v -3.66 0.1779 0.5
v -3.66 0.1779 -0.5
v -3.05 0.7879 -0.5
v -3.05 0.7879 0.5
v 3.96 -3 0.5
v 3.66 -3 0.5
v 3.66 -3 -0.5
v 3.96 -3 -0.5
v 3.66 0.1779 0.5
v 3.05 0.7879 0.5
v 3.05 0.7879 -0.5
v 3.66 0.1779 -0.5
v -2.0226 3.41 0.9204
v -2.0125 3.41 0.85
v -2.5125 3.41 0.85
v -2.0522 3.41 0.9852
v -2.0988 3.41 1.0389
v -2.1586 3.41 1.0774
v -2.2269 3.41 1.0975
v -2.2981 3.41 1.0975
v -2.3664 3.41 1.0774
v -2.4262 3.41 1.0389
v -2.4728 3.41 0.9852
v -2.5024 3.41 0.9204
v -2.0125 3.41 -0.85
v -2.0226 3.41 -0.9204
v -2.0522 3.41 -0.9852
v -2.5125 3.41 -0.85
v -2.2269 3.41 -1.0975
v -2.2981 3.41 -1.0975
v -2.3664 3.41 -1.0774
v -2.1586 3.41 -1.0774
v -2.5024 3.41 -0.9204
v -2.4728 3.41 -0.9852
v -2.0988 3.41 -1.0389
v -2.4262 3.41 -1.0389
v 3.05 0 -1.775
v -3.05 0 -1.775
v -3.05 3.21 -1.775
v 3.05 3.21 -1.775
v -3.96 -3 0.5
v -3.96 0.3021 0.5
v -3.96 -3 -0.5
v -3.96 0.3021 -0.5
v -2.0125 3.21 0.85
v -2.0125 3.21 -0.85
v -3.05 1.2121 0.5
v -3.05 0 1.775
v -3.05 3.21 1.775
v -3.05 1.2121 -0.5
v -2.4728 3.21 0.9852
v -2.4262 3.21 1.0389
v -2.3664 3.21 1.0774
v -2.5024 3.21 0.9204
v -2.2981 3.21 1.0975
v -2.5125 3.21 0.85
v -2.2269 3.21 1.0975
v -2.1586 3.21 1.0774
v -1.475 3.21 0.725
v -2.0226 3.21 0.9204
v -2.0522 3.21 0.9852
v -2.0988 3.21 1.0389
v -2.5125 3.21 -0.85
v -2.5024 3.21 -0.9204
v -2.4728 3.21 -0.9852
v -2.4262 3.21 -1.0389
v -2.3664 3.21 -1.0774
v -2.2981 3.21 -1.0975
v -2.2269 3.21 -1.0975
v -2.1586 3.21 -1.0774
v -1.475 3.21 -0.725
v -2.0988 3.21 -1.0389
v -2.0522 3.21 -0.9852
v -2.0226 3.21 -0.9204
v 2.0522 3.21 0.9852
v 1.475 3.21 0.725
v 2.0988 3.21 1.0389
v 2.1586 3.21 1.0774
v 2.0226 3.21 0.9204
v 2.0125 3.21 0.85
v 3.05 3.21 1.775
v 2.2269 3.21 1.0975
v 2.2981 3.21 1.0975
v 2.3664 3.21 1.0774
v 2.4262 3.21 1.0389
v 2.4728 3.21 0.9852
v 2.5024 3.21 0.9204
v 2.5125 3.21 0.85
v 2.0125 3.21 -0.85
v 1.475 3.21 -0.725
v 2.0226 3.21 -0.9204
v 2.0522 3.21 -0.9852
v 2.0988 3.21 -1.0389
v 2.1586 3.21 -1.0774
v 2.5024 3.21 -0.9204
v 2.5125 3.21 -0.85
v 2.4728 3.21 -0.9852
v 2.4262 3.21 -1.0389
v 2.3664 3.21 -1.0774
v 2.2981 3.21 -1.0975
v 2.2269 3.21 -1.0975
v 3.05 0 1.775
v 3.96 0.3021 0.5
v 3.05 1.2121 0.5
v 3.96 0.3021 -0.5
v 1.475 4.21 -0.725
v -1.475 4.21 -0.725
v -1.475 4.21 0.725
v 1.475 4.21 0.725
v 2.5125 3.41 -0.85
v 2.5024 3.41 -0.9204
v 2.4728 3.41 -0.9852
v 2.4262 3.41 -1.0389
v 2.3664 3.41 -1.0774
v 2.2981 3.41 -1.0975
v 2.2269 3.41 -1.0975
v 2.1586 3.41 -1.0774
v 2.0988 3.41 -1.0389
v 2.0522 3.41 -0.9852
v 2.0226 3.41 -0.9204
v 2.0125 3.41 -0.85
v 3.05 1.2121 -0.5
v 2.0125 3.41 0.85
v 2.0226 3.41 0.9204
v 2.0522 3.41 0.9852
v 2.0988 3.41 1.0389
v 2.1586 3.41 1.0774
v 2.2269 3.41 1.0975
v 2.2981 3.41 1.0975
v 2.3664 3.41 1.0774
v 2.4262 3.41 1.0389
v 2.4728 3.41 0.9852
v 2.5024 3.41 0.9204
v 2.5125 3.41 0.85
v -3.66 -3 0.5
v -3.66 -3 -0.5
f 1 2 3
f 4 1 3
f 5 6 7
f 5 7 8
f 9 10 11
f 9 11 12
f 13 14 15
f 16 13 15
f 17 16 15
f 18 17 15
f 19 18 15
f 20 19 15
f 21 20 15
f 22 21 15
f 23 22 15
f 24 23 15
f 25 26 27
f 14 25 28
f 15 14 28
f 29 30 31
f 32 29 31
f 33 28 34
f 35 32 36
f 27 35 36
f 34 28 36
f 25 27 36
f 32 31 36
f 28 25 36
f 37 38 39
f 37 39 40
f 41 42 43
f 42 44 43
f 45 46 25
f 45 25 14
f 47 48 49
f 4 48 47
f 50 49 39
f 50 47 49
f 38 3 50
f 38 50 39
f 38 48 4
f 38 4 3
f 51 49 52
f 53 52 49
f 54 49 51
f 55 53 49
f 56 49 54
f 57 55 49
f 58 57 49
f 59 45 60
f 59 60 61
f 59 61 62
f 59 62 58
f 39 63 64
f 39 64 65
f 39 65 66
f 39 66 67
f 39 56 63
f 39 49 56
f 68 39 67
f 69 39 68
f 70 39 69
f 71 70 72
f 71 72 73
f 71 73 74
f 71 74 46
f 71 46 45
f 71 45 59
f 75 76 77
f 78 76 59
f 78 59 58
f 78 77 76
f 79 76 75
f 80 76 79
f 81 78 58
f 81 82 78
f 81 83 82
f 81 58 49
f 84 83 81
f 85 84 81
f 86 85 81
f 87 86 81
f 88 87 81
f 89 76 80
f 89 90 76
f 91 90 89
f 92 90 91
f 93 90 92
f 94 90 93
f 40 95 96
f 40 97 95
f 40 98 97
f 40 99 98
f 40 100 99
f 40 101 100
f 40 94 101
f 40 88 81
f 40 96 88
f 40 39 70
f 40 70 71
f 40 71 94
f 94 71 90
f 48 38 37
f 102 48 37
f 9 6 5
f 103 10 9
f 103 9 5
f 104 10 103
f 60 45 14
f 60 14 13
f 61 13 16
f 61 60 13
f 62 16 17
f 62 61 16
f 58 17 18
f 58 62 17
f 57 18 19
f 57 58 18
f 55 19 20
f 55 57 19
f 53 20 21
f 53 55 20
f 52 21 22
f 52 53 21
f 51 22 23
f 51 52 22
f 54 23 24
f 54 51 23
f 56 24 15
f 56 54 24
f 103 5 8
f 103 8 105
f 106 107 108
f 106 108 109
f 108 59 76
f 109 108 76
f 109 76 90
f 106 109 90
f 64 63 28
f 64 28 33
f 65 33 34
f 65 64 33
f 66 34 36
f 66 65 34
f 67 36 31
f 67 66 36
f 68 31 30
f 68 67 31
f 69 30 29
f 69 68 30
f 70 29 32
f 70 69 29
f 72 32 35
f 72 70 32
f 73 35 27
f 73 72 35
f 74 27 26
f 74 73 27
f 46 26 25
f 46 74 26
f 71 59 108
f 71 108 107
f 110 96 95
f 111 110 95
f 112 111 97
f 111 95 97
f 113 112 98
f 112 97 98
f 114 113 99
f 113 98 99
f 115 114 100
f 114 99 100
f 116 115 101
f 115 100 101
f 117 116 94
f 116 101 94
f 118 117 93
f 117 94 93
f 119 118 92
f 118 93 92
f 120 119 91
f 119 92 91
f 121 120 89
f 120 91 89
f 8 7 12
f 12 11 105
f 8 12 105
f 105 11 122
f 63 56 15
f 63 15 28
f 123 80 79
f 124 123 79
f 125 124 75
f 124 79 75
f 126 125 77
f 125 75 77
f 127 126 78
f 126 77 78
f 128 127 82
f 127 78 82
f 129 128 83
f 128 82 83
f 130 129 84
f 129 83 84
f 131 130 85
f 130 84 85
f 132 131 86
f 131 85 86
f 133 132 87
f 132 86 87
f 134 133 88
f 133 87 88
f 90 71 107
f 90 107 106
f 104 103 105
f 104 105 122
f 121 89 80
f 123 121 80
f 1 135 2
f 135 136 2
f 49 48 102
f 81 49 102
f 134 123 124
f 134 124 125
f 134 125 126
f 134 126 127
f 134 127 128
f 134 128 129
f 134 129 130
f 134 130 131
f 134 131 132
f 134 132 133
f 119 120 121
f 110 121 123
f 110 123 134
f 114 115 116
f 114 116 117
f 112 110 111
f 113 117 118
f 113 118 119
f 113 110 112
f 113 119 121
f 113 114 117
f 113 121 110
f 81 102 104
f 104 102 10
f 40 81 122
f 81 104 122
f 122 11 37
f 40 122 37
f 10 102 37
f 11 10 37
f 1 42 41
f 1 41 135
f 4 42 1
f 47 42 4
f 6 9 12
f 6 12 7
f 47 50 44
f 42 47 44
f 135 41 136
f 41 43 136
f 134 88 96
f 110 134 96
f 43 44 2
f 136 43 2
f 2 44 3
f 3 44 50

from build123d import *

# Parameters (mm, degrees)
SKETCH1_W           = 6.1
SKETCH1_H           = 3.55
BOSS_EXTRUDE1_DEPTH = 3.21
SKETCH2_W           = 2.95
SKETCH2_H           = 1.45
BOSS_EXTRUDE2_DEPTH = 1
BOSS_EXTRUDE3_DEPTH = 0.2
EXTRUDE_THIN1_DEPTH = 0.5


with BuildPart() as part:
    # Sketch1 → Boss-Extrude1 (new body)
    with BuildSketch(Plane(origin=(0, 0, 0), x_dir=(1, 0, 0), z_dir=(0, 1, 0))):
        Rectangle(SKETCH1_W, SKETCH1_H)
    extrude(amount=BOSS_EXTRUDE1_DEPTH)

    # Sketch2 → Boss-Extrude2 (add)
    with BuildSketch(Plane(origin=(0, 3.21, 0), x_dir=(1, 0, 0), z_dir=(0, 1, 0))):
        Rectangle(SKETCH2_W, SKETCH2_H)
    extrude(amount=BOSS_EXTRUDE2_DEPTH)

    # Sketch3 → Boss-Extrude3 (add)
    with BuildSketch(Plane(origin=(0, 3.21, 0), x_dir=(1, 0, 0), z_dir=(0, 1, 0))):
        with BuildLine():
            Line((-2.0125, 0.85), (-2.0125, -0.85))
            ThreePointArc((-2.0125, -0.85), (-2.2625, -1.1), (-2.5125, -0.85))
            Line((-2.5125, -0.85), (-2.5125, 0.85))
            ThreePointArc((-2.5125, 0.85), (-2.2625, 1.1), (-2.0125, 0.85))
        make_face()
        with BuildLine():
            Line((2.0125, 0.85), (2.0125, -0.85))
            ThreePointArc((2.0125, -0.85), (2.2625, -1.1), (2.5125, -0.85))
            Line((2.5125, -0.85), (2.5125, 0.85))
            ThreePointArc((2.5125, 0.85), (2.2625, 1.1), (2.0125, 0.85))
        make_face()
    extrude(amount=BOSS_EXTRUDE3_DEPTH)

    # Sketch4 → Extrude-Thin1 (add, symmetric)
    with BuildSketch(Plane.XY):
        Polygon((-2.653608324, 1.60852371), (-3.96, 0.302132034), (-3.96, -3), (-3.66, -3), (-3.66, 0.177867966), (-2.44147629, 1.396391676), align=None)
        Polygon((2.44147629, 1.396391676), (3.66, 0.177867966), (3.66, -3), (3.96, -3), (3.96, 0.302132034), (2.653608324, 1.60852371), align=None)
    extrude(amount=EXTRUDE_THIN1_DEPTH, both=True)


solid = part.part
